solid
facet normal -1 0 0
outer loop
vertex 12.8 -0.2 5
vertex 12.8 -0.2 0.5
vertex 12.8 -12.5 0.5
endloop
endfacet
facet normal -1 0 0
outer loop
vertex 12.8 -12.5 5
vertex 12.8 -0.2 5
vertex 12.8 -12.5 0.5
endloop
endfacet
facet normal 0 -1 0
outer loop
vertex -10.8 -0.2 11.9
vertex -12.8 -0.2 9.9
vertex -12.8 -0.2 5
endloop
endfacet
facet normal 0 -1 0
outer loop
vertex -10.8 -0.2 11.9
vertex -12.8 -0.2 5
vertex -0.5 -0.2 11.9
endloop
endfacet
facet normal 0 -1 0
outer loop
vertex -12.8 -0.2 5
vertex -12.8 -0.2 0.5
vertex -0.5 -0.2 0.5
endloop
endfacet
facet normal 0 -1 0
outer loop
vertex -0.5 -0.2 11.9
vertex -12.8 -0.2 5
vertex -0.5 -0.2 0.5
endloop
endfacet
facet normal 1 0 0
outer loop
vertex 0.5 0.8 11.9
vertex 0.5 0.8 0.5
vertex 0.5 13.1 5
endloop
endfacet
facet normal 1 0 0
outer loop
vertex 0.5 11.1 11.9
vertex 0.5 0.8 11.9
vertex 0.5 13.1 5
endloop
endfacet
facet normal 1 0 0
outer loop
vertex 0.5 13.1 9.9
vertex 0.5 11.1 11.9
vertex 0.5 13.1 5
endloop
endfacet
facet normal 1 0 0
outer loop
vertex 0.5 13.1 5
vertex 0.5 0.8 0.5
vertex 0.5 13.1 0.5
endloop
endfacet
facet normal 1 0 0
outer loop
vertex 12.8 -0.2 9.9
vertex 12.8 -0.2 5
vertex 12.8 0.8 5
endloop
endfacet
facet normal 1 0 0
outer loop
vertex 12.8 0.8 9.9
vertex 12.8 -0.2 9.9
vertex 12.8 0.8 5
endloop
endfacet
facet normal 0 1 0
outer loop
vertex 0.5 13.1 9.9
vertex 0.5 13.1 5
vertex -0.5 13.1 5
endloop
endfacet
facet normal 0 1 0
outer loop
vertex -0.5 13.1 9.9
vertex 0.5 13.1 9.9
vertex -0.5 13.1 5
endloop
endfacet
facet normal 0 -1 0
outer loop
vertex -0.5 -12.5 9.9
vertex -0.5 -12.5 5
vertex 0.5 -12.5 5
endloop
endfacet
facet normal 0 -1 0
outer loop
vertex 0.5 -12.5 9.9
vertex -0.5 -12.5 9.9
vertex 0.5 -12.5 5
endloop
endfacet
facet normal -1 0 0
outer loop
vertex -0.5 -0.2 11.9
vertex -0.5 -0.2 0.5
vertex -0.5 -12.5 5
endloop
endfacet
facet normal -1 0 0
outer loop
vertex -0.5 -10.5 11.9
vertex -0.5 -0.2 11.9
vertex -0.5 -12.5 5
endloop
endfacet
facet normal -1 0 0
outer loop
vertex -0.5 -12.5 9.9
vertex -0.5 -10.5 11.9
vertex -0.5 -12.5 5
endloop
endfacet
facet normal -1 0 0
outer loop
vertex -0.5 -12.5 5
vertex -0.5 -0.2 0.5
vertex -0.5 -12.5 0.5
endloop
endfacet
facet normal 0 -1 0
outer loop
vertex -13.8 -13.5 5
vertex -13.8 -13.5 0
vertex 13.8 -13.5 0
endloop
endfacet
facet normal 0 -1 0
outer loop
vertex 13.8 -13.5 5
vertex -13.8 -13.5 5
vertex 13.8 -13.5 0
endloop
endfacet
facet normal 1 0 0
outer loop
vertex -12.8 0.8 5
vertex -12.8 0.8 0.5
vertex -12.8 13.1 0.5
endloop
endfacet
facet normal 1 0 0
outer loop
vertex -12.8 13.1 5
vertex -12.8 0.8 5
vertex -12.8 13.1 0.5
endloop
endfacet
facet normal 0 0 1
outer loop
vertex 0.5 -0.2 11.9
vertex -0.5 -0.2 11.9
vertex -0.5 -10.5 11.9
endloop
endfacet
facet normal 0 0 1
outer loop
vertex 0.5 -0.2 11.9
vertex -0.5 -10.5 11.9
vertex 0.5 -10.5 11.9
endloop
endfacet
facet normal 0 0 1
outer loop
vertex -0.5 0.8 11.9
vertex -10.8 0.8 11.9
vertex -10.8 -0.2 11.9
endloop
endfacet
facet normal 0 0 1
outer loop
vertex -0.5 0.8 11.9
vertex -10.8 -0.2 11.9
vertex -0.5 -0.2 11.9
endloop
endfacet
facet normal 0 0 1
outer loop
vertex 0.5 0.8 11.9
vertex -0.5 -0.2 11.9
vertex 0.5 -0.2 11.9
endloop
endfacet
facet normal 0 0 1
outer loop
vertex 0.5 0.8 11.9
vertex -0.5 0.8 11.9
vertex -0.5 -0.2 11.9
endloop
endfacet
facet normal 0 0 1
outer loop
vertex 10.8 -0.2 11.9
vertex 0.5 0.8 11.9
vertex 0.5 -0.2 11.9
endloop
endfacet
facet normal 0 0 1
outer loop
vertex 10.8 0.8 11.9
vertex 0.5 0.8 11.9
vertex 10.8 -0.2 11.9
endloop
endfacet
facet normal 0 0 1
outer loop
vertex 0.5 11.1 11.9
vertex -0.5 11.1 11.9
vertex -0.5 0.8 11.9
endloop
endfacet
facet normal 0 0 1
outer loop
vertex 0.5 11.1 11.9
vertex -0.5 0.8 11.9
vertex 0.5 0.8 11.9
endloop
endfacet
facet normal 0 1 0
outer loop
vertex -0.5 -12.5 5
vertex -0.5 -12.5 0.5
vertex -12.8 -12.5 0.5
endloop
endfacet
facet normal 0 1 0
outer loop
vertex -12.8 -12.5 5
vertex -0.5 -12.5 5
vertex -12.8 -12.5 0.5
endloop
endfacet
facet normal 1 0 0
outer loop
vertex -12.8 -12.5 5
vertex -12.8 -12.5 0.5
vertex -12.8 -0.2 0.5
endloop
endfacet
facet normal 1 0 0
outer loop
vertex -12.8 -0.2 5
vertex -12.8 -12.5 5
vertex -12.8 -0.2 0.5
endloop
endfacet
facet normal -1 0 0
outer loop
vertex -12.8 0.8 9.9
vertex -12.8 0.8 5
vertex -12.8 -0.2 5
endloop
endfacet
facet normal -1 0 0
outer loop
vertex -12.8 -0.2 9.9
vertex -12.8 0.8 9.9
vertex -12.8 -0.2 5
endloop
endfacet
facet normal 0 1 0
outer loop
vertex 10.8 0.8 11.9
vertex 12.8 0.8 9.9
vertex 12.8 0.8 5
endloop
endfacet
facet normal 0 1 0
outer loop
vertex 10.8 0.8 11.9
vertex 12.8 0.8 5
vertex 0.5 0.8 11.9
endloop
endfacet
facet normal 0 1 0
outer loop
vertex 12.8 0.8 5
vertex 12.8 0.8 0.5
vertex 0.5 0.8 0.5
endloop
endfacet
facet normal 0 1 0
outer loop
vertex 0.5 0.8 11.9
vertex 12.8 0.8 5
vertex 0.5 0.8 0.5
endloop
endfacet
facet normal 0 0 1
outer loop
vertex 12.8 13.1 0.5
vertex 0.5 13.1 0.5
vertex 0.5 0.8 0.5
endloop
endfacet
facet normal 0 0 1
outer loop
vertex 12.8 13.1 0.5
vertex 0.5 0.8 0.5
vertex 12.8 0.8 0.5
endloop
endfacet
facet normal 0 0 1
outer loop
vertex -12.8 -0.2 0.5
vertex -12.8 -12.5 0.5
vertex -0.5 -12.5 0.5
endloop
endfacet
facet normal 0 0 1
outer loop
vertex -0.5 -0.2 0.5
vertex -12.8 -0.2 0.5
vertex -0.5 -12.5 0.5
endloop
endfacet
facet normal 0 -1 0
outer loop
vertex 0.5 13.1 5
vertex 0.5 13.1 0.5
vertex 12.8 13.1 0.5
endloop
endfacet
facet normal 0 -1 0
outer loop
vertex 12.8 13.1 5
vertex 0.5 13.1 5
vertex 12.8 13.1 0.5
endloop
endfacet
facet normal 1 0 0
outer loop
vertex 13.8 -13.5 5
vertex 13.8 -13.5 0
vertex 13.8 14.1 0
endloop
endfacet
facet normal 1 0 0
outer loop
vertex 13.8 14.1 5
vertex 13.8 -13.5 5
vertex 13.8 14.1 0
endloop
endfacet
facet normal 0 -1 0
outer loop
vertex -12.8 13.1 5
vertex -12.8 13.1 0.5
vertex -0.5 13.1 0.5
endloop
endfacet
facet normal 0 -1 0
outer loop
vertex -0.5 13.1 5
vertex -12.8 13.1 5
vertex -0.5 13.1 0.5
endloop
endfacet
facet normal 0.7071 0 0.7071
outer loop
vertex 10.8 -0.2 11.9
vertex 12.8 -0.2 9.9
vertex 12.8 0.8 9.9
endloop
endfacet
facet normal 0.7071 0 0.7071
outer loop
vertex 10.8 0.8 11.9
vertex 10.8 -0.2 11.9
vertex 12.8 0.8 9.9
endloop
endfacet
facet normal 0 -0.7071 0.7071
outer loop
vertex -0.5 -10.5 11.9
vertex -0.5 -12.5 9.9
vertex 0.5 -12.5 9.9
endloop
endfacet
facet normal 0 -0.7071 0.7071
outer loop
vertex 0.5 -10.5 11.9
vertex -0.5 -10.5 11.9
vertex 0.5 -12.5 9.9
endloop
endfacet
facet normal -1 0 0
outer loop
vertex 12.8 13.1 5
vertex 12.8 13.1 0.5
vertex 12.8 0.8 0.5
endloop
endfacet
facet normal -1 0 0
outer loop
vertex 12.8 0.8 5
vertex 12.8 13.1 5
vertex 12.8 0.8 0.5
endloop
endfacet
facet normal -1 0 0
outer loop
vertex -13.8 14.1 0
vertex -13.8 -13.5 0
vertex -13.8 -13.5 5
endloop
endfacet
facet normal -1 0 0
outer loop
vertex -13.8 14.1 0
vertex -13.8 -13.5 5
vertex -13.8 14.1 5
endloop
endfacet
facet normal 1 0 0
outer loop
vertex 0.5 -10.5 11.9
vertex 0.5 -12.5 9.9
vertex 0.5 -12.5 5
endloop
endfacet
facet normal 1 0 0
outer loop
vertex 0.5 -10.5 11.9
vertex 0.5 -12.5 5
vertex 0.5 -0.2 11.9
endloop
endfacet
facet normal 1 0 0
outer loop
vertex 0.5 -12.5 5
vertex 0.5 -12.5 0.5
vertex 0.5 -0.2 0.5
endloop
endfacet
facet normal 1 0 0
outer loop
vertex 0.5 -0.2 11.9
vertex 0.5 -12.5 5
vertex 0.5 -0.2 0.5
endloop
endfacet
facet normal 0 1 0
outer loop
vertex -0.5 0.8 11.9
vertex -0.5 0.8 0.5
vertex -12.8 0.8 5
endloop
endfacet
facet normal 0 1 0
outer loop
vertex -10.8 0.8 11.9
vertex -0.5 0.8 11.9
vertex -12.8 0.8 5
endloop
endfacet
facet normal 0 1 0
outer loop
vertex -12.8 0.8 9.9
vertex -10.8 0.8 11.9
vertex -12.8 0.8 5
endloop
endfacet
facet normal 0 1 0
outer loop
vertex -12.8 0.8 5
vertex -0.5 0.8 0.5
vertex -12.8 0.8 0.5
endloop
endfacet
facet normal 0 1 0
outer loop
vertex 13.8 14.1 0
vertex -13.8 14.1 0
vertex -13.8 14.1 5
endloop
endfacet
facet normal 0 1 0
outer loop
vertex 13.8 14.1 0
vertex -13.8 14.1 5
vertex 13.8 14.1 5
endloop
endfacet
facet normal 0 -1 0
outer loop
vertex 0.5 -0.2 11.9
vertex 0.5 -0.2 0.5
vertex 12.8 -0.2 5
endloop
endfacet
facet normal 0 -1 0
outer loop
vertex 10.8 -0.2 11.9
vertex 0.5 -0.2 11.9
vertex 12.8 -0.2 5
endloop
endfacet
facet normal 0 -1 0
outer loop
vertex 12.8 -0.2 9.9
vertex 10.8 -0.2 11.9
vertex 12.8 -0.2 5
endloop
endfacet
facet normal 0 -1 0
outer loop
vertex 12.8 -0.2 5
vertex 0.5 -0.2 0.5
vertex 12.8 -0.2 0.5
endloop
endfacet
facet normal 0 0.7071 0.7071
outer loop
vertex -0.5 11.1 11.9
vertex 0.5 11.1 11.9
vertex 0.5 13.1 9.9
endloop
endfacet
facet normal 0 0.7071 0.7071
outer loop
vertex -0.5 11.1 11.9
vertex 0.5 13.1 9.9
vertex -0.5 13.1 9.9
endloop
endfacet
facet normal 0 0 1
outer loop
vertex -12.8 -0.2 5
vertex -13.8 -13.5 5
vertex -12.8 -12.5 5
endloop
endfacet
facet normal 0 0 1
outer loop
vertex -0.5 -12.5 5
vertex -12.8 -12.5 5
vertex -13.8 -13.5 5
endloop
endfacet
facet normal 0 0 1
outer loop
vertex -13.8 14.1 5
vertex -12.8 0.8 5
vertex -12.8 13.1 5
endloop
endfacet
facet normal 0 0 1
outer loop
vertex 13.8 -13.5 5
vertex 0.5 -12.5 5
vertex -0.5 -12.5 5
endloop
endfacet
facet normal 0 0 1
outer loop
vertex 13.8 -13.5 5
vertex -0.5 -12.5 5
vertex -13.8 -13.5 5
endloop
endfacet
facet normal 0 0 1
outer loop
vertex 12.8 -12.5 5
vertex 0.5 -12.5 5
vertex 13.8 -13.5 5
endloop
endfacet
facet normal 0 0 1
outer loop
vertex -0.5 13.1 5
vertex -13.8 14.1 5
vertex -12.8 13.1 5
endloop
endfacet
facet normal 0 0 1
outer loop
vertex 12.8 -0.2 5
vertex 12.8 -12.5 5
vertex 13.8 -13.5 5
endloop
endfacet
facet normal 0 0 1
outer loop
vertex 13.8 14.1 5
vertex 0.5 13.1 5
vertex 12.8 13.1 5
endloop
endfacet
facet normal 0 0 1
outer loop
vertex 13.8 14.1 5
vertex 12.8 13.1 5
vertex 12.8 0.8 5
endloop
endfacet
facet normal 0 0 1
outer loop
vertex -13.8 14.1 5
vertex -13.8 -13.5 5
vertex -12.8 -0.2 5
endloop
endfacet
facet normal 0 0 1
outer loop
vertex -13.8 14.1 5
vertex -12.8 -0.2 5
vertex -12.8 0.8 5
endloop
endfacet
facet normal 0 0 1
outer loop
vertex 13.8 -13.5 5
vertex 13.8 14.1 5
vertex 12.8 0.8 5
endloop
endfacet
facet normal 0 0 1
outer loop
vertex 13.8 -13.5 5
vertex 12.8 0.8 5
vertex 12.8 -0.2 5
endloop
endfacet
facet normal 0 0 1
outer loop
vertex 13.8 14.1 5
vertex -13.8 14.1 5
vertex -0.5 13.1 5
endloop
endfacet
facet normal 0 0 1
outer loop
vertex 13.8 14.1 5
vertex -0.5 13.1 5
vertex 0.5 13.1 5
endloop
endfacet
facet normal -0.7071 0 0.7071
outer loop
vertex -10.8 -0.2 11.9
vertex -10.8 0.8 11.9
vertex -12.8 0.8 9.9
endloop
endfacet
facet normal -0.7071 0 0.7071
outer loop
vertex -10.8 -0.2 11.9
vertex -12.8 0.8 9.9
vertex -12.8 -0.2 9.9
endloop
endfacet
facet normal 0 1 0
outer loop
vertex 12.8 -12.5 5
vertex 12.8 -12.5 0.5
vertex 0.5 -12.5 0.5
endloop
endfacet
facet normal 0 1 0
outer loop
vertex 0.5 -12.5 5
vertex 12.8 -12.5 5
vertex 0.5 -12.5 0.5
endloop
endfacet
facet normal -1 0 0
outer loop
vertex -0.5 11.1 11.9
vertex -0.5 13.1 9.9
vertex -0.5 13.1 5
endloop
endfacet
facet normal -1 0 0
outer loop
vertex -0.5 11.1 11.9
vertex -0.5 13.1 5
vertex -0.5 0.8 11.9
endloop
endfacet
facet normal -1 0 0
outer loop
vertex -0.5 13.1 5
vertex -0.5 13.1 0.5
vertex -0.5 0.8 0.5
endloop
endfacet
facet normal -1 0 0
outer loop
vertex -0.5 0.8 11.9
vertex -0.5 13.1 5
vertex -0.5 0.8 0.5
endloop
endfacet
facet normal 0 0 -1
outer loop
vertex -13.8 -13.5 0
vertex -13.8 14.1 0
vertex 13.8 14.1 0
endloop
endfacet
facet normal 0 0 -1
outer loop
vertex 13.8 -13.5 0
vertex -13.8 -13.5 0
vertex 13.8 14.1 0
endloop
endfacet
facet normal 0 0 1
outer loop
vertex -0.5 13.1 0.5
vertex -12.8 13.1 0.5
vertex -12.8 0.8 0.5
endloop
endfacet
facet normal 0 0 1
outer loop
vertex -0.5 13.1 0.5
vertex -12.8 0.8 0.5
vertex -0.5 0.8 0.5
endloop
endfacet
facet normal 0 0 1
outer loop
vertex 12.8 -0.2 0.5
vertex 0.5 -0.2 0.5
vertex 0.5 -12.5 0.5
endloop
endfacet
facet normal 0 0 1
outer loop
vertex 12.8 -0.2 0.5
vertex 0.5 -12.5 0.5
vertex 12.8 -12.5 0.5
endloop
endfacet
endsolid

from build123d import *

# Parameters (mm, degrees)
F1_DEPTH = 11.9
F0_W     = 27.6
F0_H     = 27.6
F2_DEPTH = 5
F3_W     = 27
F3_H     = 27
F4_DEPTH = 0.5
F5_SIZE  = 2


with BuildPart() as f1:
    # F0 (on Top) → F1 (new body)
    with BuildSketch(Plane.XY):
        Polygon((0.5, 13.1), (-0.5, 13.1), (-0.5, 0.8), (-12.8, 0.8), (-12.8, -0.2), (-0.5, -0.2), (-0.5, -12.5), (0.5, -12.5), (0.5, -0.2), (12.8, -0.2), (12.8, 0.8), (0.5, 0.8), align=None)
    extrude(amount=F1_DEPTH)

    # F0 (on Top) → F2 (join)
    with BuildSketch(Plane.XY):
        with Locations((0, 0.3)):
            Rectangle(F0_W, F0_H)
        Polygon((-12.8, 0.8), (-12.8, 13.1), (-0.5, 13.1), (0.5, 13.1), (12.8, 13.1), (12.8, 0.8), (12.8, -0.2), (12.8, -12.5), (0.5, -12.5), (-0.5, -12.5), (-12.8, -12.5), (-12.8, -0.2), align=None, mode=Mode.SUBTRACT)
    extrude(amount=F2_DEPTH)

    # F3 (on Top) → F4 (join)
    with BuildSketch(Plane.XY):
        Rectangle(F3_W, F3_H)
    extrude(amount=F4_DEPTH)

    # F5
    f5_edges = [f1.edges().sort_by_distance(p)[0] for p in [
        (0, 13.1, 11.9),
        (-12.8, 0.3, 11.9),
        (0, -12.5, 11.9),
        (12.8, 0.3, 11.9),
    ]]
    chamfer(f5_edges, length=F5_SIZE)


solid = f1.part
